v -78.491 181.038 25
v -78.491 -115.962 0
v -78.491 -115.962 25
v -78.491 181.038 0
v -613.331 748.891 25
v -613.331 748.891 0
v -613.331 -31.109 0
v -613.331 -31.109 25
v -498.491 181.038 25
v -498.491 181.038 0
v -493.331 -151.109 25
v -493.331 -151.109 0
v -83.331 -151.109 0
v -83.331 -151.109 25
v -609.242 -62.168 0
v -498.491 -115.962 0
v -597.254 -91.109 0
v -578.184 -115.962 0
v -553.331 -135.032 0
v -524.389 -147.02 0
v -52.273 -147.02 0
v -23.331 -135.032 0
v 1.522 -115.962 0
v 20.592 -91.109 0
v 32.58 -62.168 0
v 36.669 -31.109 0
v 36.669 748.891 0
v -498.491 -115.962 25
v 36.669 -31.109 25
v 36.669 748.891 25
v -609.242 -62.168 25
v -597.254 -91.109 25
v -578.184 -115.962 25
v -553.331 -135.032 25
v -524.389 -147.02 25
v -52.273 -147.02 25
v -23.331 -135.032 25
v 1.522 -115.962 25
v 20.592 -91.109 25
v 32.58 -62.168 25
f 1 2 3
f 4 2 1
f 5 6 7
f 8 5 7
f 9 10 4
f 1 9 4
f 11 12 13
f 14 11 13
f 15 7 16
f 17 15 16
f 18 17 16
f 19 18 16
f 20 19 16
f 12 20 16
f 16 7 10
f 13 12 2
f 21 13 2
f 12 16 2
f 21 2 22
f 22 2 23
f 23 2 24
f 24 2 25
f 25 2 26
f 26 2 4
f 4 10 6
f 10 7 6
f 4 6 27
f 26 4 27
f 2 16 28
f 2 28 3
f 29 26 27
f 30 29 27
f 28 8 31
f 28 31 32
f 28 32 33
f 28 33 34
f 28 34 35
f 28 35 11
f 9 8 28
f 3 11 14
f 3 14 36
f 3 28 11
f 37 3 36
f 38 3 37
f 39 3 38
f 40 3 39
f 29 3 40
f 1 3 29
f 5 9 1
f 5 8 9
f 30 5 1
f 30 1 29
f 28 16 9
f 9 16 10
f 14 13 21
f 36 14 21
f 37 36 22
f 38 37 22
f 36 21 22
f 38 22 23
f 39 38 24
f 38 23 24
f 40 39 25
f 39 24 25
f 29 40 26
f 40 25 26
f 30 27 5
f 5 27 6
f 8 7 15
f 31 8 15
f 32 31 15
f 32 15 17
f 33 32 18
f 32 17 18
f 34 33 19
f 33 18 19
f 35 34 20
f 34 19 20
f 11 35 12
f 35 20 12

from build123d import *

# Parameters (mm, degrees)
F0_W     = 420
F0_H     = 297
F1_DEPTH = 18
F2_DEPTH = 25


with BuildPart() as f1:
    # F0 (on Top) → F1 (new body)
    with BuildSketch(Plane.XY):
        with BuildLine():
            Line((36.669135, 748.890698), (-613.330865, 748.890698))
            Line((-613.330865, 748.890698), (-613.330865, -31.109302))
            ThreePointArc((-613.330865, -31.109302), (-578.183679, -115.962116), (-493.330865, -151.109302))
            Line((-493.330865, -151.109302), (-83.330865, -151.109302))
            ThreePointArc((-83.330865, -151.109302), (1.521949, -115.962116), (36.669135, -31.109302))
            Line((36.669135, -31.109302), (36.669135, 748.890698))
        make_face()
        with Locations((-288.491384, 32.537884)):
            Rectangle(F0_W, F0_H, mode=Mode.SUBTRACT)
    extrude(amount=F1_DEPTH)

    # F0 (on Top) → F2 (join)
    with BuildSketch(Plane.XY):
        with BuildLine():
            Line((36.669135, 748.890698), (-613.330865, 748.890698))
            Line((-613.330865, 748.890698), (-613.330865, -31.109302))
            ThreePointArc((-613.330865, -31.109302), (-578.183679, -115.962116), (-493.330865, -151.109302))
            Line((-493.330865, -151.109302), (-83.330865, -151.109302))
            ThreePointArc((-83.330865, -151.109302), (1.521949, -115.962116), (36.669135, -31.109302))
            Line((36.669135, -31.109302), (36.669135, 748.890698))
        make_face()
        with Locations((-288.491384, 32.537884)):
            Rectangle(F0_W, F0_H, mode=Mode.SUBTRACT)
    extrude(amount=F2_DEPTH)


solid = f1.part
